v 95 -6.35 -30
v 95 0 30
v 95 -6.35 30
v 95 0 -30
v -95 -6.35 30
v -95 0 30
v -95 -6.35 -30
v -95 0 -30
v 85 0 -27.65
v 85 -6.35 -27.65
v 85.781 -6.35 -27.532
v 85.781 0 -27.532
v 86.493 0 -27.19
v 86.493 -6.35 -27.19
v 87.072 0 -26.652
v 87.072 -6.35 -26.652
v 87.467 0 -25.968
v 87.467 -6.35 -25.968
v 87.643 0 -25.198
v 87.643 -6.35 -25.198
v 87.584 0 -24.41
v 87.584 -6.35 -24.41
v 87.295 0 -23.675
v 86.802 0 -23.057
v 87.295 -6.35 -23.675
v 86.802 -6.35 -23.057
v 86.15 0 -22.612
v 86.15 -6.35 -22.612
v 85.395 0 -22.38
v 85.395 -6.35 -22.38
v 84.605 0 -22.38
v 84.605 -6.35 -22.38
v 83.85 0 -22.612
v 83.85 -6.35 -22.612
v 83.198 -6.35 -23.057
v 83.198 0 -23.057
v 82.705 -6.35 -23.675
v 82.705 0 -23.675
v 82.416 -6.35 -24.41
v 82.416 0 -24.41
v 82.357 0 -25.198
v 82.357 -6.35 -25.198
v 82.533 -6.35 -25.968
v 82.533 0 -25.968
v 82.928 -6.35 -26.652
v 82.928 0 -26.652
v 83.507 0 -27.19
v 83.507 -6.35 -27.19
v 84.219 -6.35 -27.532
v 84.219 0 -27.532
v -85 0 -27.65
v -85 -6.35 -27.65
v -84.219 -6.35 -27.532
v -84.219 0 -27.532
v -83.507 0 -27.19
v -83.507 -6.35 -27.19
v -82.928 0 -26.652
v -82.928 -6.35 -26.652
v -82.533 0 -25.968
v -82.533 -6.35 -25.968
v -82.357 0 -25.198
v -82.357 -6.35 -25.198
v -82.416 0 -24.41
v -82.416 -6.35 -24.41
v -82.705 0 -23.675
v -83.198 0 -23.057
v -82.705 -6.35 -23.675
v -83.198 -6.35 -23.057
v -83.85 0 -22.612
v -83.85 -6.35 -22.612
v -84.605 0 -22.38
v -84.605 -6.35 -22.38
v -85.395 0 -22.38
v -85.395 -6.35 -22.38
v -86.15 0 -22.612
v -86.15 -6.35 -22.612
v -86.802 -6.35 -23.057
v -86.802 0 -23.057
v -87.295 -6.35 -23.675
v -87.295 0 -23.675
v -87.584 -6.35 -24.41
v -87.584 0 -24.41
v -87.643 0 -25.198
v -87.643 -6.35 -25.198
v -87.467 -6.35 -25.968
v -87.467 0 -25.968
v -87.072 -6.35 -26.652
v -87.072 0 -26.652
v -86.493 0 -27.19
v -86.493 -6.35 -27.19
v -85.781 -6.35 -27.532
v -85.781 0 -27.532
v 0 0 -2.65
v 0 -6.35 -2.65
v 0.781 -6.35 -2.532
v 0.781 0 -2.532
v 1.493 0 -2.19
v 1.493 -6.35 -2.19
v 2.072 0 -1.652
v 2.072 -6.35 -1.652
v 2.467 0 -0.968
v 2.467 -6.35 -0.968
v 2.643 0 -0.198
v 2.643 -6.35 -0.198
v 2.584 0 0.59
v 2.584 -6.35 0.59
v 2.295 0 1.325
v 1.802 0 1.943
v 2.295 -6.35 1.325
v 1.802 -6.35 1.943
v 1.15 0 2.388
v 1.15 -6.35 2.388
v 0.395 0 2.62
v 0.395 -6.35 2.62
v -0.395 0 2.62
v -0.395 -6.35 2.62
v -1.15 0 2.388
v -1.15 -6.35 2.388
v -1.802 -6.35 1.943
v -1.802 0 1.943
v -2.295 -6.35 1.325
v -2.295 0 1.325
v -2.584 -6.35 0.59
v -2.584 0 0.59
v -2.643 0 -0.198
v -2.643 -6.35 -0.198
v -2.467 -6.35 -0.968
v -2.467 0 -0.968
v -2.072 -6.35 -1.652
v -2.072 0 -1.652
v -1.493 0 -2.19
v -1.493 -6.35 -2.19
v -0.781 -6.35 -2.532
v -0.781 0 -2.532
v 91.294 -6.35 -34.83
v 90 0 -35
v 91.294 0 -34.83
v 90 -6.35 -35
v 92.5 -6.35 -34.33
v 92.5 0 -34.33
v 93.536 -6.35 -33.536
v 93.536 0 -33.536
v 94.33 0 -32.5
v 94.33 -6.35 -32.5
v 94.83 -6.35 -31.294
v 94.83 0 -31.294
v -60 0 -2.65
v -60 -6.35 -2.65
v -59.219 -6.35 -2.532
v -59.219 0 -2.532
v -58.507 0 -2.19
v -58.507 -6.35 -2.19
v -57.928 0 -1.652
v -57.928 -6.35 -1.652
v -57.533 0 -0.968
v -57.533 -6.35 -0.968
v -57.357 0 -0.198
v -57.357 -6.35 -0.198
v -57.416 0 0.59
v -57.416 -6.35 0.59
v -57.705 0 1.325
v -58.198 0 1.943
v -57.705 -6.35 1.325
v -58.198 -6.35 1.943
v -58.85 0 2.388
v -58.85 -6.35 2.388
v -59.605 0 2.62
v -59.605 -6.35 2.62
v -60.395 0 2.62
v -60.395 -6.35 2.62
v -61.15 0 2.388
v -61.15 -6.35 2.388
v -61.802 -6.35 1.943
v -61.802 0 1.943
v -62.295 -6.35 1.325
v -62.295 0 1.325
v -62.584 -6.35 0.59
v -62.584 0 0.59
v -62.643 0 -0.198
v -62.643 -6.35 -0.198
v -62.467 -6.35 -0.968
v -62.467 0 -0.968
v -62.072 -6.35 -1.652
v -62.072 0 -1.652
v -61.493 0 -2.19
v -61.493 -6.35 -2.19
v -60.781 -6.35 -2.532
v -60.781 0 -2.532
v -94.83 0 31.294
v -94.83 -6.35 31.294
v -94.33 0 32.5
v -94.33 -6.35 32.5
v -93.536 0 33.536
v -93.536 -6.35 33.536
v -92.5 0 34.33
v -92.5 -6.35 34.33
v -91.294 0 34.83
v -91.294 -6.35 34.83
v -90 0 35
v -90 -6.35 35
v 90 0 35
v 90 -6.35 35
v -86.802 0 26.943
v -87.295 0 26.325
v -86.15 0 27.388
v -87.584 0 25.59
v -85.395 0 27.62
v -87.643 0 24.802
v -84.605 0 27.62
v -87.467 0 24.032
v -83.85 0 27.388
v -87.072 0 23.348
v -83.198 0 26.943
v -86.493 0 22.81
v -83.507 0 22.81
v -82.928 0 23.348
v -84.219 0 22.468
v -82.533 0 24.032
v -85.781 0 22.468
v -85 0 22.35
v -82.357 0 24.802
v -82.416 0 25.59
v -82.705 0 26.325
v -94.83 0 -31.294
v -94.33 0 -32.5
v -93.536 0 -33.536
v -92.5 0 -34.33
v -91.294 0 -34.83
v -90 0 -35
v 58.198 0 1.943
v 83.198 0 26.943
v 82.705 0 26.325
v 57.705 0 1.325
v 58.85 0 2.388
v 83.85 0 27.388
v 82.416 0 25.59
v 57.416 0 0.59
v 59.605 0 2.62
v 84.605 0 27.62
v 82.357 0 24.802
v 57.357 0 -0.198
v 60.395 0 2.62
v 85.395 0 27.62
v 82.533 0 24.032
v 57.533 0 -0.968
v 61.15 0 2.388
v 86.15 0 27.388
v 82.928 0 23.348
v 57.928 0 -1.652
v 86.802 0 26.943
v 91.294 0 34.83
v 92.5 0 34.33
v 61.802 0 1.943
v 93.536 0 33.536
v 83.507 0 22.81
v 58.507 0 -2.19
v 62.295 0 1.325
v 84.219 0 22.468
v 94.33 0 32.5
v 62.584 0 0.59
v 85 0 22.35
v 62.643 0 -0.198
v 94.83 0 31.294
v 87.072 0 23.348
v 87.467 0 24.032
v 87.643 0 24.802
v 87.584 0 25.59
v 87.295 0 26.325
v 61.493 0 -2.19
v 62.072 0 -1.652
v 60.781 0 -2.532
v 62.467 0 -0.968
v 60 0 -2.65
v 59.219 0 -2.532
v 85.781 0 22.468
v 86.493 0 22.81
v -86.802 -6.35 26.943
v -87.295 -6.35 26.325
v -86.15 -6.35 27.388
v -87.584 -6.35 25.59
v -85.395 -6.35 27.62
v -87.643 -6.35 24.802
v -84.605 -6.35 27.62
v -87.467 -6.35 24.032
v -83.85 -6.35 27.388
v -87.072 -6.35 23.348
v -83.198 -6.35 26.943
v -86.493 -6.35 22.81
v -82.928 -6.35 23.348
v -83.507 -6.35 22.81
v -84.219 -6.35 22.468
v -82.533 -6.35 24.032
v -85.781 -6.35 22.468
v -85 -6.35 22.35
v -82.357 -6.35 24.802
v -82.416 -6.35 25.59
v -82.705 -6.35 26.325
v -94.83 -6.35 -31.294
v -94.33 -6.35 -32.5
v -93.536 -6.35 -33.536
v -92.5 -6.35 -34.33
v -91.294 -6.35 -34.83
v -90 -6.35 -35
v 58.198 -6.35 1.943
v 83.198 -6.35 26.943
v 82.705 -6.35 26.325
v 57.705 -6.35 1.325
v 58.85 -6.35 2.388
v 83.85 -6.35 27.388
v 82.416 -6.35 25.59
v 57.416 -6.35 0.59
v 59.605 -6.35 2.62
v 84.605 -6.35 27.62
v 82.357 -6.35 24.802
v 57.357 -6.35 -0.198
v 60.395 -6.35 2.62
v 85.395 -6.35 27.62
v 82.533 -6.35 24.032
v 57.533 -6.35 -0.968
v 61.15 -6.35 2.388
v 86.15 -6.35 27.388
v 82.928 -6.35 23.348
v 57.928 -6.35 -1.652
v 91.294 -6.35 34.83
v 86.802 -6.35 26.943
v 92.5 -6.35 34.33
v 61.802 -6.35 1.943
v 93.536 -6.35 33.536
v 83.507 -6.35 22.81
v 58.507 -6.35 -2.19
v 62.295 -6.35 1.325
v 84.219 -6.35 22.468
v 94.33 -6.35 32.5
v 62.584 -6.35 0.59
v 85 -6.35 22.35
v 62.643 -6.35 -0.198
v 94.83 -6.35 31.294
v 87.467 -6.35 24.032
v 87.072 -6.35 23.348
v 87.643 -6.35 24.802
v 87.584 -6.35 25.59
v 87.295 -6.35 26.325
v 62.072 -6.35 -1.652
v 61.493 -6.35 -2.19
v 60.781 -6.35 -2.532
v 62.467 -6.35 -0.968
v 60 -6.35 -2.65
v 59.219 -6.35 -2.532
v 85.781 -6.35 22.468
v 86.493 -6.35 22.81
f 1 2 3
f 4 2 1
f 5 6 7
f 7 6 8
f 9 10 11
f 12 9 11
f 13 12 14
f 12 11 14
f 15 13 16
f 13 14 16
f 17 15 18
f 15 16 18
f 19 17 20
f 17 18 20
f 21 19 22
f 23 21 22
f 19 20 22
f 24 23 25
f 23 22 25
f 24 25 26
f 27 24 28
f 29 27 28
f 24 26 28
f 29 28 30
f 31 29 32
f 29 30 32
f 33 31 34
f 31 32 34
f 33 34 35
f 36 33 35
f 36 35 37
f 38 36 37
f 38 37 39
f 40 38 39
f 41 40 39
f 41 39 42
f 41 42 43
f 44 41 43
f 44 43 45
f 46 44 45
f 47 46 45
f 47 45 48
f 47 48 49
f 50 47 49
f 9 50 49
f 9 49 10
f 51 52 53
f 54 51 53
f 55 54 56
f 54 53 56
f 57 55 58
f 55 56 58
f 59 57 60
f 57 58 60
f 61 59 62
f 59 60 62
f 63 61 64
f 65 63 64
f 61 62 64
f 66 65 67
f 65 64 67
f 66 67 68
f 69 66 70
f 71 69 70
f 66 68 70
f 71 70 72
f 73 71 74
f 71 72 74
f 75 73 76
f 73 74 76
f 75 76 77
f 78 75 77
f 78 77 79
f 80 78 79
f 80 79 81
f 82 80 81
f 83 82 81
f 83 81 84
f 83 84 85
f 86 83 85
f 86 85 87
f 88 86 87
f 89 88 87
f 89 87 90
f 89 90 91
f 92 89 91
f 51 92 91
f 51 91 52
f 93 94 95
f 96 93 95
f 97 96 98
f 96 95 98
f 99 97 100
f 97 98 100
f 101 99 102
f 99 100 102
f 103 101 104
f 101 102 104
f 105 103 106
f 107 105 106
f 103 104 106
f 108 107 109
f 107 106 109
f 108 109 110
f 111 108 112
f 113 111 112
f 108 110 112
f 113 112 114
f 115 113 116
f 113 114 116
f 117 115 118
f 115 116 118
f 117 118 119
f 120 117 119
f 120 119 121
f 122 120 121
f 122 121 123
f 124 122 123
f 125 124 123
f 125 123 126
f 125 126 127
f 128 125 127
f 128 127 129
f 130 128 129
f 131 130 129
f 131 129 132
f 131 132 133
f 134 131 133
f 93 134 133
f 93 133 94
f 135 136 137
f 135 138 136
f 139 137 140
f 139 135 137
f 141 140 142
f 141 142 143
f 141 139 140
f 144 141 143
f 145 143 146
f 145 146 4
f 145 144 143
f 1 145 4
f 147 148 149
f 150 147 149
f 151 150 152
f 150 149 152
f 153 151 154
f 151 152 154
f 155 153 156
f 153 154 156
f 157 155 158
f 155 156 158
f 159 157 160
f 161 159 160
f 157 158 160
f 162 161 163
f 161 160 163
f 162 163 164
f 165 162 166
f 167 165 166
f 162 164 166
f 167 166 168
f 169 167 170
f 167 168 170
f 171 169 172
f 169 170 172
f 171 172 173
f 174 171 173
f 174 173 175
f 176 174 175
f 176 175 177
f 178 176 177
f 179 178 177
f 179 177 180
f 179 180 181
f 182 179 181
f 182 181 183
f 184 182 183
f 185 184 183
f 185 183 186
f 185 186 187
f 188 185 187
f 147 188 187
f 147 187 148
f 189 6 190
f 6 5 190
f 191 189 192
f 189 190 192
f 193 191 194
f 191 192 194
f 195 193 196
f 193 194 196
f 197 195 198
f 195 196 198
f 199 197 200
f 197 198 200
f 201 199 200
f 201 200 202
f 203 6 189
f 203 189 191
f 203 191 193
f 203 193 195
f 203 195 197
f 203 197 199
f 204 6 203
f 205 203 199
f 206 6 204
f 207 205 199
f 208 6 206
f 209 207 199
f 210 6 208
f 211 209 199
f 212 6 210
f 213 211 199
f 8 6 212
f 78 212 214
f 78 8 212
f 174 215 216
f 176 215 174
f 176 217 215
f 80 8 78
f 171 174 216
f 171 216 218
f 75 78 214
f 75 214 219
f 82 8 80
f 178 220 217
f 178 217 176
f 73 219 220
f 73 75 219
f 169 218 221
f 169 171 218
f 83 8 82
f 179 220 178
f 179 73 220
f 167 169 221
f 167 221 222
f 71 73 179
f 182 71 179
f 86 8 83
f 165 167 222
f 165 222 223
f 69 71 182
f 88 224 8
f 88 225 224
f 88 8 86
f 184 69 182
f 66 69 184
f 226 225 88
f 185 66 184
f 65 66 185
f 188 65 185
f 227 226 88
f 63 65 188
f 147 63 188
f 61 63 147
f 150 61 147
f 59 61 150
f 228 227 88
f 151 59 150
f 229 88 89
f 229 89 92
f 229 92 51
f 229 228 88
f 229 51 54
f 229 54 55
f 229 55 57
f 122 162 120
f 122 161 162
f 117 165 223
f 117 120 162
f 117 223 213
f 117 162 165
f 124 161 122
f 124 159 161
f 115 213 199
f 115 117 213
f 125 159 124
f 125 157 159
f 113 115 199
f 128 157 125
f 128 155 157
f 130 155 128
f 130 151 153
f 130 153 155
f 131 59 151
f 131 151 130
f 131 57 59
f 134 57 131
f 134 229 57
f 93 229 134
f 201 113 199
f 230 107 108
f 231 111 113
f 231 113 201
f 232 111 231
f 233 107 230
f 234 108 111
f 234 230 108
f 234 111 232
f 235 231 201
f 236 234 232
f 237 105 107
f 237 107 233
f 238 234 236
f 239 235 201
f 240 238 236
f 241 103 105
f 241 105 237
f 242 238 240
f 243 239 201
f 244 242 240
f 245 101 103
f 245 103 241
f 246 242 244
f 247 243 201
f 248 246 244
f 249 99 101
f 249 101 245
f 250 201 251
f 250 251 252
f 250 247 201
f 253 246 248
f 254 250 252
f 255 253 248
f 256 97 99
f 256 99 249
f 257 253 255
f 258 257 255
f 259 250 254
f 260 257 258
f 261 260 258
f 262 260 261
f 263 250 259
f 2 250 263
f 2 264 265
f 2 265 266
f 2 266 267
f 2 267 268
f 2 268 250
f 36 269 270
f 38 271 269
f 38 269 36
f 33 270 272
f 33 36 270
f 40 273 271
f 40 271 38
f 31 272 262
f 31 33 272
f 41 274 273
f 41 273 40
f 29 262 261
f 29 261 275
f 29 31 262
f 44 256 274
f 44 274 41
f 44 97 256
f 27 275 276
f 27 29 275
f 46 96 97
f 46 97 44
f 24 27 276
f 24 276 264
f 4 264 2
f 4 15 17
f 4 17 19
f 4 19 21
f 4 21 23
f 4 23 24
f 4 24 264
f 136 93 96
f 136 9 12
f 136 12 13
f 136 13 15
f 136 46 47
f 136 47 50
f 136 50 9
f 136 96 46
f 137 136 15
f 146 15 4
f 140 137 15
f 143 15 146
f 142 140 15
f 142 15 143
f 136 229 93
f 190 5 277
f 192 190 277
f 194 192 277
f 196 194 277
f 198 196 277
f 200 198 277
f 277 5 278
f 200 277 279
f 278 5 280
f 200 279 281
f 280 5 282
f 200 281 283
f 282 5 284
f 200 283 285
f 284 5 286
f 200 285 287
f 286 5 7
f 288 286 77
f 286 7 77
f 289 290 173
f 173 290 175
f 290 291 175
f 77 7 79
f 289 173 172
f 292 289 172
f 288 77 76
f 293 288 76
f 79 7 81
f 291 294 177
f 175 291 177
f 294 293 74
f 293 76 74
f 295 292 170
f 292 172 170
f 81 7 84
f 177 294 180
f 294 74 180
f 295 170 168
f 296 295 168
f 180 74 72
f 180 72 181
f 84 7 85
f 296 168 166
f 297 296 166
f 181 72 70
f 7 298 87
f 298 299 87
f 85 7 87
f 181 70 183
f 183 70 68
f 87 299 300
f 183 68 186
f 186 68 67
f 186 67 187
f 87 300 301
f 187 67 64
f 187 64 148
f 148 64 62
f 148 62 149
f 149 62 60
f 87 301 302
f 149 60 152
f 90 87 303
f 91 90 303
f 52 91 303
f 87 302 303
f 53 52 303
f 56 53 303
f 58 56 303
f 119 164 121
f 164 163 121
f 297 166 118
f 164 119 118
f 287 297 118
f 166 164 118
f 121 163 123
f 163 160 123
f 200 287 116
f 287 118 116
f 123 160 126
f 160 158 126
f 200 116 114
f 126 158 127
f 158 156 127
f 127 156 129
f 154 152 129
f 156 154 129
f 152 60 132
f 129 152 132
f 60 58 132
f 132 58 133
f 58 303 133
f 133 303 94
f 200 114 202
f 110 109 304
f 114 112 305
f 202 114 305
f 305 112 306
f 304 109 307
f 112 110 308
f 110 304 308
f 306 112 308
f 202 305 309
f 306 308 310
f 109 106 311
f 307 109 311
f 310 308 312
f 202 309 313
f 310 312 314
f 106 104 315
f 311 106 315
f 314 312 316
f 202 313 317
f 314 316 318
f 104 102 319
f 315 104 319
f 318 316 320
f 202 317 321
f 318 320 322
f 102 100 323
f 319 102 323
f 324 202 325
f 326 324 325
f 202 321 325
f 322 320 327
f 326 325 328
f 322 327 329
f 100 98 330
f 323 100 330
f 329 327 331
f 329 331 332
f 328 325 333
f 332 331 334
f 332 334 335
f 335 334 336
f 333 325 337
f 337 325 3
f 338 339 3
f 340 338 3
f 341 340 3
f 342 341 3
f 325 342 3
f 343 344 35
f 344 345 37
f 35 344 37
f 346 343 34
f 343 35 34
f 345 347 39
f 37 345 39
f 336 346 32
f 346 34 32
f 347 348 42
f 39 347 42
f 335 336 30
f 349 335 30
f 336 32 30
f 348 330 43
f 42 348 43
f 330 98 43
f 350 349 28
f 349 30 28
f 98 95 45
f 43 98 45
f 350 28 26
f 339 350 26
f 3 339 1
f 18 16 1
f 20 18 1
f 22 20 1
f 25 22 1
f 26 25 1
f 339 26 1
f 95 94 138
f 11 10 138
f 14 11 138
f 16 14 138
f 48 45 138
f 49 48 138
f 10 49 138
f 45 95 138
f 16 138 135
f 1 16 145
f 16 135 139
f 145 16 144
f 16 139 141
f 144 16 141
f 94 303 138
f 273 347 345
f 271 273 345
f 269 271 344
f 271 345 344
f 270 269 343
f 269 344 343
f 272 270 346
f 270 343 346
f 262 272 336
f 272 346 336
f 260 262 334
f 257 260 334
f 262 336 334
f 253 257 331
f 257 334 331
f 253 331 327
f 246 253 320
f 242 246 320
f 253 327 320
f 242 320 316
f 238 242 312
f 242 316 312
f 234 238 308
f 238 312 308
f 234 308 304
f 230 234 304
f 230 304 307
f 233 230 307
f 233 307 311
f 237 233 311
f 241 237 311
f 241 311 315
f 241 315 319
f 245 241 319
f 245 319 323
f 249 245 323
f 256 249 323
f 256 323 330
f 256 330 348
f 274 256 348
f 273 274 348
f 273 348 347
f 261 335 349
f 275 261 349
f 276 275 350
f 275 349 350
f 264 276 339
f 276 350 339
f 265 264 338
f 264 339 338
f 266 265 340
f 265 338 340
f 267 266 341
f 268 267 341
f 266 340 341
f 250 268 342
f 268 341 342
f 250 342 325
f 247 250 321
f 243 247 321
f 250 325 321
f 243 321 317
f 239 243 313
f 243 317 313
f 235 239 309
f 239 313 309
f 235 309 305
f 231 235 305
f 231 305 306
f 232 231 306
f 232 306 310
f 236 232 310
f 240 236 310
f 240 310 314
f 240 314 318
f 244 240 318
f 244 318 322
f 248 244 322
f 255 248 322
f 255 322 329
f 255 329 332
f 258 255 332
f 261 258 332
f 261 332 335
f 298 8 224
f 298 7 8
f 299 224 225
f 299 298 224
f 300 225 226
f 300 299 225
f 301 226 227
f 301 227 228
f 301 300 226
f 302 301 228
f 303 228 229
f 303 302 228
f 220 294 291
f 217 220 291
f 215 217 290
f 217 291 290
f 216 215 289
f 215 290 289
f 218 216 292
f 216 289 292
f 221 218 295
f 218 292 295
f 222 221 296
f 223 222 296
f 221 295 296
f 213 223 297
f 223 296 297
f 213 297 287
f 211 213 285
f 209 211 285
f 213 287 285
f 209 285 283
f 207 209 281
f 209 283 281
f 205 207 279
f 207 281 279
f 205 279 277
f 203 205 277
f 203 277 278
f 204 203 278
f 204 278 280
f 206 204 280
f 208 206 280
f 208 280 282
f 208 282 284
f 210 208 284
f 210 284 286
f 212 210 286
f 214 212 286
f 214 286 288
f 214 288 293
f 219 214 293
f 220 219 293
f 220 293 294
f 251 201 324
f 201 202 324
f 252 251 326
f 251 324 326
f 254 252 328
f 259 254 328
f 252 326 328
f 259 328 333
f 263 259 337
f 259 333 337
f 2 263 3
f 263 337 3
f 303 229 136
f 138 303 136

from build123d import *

# Parameters (mm, degrees)
SKETCH1_W            = 190
SKETCH1_H            = 70
BOSS_EXTRUDE1_DEPTH  = 6.35
M5_CLEARANCE_HOLE1_D = 5.3
FILLET1_R            = 5


with BuildPart() as part:
    # Sketch1 → Boss-Extrude1 (new body)
    with BuildSketch(Plane(origin=(0, 0, 0), x_dir=(1, 0, 0), z_dir=(0, 1, 0))):
        Rectangle(SKETCH1_W, SKETCH1_H)
    extrude(amount=-BOSS_EXTRUDE1_DEPTH)

    # M5 Clearance Hole1 (through all)
    with Locations(Plane(origin=(-85, 0, -25), x_dir=(0, 0, 1), z_dir=(0, 1, 0))):
        with Locations((0, 0), (50, 0), (25, 145), (0, 170), (25, 85), (25, 25), (50, 170)):
            Hole(M5_CLEARANCE_HOLE1_D / 2)

    # Fillet1
    fillet1_edges = [part.edges().sort_by_distance(p)[0] for p in [
        (-95, -3.175, -35),
        (95, -3.175, -35),
        (95, -3.175, 35),
        (-95, -3.175, 35),
    ]]
    fillet(fillet1_edges, radius=FILLET1_R)


solid = part.part
